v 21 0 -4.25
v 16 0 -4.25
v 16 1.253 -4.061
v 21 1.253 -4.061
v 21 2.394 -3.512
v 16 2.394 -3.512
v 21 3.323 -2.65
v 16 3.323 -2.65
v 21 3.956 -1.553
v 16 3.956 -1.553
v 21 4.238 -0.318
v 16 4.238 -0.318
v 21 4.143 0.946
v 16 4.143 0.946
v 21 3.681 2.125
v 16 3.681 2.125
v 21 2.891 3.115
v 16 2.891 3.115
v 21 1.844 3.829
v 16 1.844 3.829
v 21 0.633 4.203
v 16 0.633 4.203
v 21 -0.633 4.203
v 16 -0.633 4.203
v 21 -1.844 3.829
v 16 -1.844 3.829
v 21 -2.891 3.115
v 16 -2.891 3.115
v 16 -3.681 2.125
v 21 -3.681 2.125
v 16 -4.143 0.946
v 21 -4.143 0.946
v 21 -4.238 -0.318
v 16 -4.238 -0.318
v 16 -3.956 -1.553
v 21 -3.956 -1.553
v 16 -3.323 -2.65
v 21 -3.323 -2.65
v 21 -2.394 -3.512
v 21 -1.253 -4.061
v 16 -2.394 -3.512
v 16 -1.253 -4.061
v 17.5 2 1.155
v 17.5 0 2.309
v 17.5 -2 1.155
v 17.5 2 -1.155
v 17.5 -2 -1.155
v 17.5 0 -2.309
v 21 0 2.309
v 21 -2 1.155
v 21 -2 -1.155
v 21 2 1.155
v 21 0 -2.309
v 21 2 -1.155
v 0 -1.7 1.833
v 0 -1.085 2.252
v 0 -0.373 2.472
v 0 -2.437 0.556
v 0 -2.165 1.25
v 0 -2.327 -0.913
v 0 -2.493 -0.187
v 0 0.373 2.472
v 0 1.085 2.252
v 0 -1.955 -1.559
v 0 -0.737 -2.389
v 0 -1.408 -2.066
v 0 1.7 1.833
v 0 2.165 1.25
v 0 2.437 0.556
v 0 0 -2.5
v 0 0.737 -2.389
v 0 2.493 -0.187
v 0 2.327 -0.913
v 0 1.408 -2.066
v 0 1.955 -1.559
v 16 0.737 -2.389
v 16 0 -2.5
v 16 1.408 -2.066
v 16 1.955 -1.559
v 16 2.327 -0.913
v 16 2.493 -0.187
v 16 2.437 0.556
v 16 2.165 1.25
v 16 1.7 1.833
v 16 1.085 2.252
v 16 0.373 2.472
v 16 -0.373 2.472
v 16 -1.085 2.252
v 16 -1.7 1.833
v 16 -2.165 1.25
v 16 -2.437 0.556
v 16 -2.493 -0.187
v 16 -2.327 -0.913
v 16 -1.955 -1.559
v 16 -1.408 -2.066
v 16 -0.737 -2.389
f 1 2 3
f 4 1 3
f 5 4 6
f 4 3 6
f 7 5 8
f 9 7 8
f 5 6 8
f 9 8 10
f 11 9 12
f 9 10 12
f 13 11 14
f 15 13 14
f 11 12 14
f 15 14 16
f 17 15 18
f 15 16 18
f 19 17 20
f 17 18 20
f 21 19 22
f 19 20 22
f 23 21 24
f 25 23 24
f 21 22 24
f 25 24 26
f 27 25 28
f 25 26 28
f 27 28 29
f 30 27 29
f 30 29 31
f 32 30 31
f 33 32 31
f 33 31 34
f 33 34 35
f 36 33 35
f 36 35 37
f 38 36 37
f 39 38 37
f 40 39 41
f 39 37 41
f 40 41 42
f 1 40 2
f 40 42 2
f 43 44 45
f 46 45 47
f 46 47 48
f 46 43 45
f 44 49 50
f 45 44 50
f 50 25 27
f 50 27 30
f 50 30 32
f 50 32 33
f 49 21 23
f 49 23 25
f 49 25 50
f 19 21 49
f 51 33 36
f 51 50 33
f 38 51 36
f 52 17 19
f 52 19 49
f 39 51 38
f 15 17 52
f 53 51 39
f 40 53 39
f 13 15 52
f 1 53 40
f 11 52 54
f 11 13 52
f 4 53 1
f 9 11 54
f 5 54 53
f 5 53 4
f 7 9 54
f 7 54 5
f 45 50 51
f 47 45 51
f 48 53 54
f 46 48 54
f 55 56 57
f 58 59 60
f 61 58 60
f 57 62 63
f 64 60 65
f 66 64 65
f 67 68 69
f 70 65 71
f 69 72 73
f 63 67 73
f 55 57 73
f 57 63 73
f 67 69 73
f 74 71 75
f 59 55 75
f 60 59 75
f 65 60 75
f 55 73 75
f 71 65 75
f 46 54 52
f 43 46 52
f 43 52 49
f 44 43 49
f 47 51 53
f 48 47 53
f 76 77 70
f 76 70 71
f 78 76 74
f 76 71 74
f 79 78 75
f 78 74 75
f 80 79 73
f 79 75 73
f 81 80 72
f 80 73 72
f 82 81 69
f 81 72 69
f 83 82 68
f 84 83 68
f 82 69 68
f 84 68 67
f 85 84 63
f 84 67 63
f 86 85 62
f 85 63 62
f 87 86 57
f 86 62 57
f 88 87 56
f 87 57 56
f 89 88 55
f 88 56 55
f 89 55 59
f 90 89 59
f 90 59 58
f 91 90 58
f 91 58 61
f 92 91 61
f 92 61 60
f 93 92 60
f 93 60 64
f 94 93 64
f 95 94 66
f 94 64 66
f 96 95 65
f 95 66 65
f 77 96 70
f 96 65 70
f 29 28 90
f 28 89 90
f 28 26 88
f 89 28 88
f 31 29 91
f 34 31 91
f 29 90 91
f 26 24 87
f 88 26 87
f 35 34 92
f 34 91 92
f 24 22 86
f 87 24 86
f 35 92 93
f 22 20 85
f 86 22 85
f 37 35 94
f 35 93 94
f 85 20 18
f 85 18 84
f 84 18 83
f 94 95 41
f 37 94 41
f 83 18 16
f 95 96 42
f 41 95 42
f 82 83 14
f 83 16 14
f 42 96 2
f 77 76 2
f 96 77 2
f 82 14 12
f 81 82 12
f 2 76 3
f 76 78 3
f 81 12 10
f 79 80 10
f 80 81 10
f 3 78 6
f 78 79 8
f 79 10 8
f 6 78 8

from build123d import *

# Parameters (mm, degrees)
ESQUISSE1_R             = 2.5
BOSS_EXTRU_1_DEPTH      = 16
ESQUISSE2_R             = 4.25
BOSS_EXTRU_2_DEPTH      = 5
ENL_V_MAT_EXTRU_1_DEPTH = 3.5


with BuildPart() as part:
    # Esquisse1 → Boss.-Extru.1 (new body)
    with BuildSketch(Plane(origin=(0, 0, 0), x_dir=(0, 0, -1), z_dir=(1, 0, 0))):
        Circle(ESQUISSE1_R)
    extrude(amount=BOSS_EXTRU_1_DEPTH)

    # Esquisse2 → Boss.-Extru.2 (add)
    with BuildSketch(Plane(origin=(16, 0, 0), x_dir=(0, 0, -1), z_dir=(1, 0, 0))):
        Circle(ESQUISSE2_R)
    extrude(amount=BOSS_EXTRU_2_DEPTH)

    # Esquisse3 → Enlèv. mat.-Extru.1 (cut)
    with BuildSketch(Plane(origin=(21, 0, 0), x_dir=(0, 0, -1), z_dir=(1, 0, 0))):
        Polygon((2.309401077, 0), (1.154700538, 2), (-1.154700538, 2), (-2.309401077, 0), (-1.154700538, -2), (1.154700538, -2), align=None)
    extrude(amount=-ENL_V_MAT_EXTRU_1_DEPTH, mode=Mode.SUBTRACT)


solid = part.part
